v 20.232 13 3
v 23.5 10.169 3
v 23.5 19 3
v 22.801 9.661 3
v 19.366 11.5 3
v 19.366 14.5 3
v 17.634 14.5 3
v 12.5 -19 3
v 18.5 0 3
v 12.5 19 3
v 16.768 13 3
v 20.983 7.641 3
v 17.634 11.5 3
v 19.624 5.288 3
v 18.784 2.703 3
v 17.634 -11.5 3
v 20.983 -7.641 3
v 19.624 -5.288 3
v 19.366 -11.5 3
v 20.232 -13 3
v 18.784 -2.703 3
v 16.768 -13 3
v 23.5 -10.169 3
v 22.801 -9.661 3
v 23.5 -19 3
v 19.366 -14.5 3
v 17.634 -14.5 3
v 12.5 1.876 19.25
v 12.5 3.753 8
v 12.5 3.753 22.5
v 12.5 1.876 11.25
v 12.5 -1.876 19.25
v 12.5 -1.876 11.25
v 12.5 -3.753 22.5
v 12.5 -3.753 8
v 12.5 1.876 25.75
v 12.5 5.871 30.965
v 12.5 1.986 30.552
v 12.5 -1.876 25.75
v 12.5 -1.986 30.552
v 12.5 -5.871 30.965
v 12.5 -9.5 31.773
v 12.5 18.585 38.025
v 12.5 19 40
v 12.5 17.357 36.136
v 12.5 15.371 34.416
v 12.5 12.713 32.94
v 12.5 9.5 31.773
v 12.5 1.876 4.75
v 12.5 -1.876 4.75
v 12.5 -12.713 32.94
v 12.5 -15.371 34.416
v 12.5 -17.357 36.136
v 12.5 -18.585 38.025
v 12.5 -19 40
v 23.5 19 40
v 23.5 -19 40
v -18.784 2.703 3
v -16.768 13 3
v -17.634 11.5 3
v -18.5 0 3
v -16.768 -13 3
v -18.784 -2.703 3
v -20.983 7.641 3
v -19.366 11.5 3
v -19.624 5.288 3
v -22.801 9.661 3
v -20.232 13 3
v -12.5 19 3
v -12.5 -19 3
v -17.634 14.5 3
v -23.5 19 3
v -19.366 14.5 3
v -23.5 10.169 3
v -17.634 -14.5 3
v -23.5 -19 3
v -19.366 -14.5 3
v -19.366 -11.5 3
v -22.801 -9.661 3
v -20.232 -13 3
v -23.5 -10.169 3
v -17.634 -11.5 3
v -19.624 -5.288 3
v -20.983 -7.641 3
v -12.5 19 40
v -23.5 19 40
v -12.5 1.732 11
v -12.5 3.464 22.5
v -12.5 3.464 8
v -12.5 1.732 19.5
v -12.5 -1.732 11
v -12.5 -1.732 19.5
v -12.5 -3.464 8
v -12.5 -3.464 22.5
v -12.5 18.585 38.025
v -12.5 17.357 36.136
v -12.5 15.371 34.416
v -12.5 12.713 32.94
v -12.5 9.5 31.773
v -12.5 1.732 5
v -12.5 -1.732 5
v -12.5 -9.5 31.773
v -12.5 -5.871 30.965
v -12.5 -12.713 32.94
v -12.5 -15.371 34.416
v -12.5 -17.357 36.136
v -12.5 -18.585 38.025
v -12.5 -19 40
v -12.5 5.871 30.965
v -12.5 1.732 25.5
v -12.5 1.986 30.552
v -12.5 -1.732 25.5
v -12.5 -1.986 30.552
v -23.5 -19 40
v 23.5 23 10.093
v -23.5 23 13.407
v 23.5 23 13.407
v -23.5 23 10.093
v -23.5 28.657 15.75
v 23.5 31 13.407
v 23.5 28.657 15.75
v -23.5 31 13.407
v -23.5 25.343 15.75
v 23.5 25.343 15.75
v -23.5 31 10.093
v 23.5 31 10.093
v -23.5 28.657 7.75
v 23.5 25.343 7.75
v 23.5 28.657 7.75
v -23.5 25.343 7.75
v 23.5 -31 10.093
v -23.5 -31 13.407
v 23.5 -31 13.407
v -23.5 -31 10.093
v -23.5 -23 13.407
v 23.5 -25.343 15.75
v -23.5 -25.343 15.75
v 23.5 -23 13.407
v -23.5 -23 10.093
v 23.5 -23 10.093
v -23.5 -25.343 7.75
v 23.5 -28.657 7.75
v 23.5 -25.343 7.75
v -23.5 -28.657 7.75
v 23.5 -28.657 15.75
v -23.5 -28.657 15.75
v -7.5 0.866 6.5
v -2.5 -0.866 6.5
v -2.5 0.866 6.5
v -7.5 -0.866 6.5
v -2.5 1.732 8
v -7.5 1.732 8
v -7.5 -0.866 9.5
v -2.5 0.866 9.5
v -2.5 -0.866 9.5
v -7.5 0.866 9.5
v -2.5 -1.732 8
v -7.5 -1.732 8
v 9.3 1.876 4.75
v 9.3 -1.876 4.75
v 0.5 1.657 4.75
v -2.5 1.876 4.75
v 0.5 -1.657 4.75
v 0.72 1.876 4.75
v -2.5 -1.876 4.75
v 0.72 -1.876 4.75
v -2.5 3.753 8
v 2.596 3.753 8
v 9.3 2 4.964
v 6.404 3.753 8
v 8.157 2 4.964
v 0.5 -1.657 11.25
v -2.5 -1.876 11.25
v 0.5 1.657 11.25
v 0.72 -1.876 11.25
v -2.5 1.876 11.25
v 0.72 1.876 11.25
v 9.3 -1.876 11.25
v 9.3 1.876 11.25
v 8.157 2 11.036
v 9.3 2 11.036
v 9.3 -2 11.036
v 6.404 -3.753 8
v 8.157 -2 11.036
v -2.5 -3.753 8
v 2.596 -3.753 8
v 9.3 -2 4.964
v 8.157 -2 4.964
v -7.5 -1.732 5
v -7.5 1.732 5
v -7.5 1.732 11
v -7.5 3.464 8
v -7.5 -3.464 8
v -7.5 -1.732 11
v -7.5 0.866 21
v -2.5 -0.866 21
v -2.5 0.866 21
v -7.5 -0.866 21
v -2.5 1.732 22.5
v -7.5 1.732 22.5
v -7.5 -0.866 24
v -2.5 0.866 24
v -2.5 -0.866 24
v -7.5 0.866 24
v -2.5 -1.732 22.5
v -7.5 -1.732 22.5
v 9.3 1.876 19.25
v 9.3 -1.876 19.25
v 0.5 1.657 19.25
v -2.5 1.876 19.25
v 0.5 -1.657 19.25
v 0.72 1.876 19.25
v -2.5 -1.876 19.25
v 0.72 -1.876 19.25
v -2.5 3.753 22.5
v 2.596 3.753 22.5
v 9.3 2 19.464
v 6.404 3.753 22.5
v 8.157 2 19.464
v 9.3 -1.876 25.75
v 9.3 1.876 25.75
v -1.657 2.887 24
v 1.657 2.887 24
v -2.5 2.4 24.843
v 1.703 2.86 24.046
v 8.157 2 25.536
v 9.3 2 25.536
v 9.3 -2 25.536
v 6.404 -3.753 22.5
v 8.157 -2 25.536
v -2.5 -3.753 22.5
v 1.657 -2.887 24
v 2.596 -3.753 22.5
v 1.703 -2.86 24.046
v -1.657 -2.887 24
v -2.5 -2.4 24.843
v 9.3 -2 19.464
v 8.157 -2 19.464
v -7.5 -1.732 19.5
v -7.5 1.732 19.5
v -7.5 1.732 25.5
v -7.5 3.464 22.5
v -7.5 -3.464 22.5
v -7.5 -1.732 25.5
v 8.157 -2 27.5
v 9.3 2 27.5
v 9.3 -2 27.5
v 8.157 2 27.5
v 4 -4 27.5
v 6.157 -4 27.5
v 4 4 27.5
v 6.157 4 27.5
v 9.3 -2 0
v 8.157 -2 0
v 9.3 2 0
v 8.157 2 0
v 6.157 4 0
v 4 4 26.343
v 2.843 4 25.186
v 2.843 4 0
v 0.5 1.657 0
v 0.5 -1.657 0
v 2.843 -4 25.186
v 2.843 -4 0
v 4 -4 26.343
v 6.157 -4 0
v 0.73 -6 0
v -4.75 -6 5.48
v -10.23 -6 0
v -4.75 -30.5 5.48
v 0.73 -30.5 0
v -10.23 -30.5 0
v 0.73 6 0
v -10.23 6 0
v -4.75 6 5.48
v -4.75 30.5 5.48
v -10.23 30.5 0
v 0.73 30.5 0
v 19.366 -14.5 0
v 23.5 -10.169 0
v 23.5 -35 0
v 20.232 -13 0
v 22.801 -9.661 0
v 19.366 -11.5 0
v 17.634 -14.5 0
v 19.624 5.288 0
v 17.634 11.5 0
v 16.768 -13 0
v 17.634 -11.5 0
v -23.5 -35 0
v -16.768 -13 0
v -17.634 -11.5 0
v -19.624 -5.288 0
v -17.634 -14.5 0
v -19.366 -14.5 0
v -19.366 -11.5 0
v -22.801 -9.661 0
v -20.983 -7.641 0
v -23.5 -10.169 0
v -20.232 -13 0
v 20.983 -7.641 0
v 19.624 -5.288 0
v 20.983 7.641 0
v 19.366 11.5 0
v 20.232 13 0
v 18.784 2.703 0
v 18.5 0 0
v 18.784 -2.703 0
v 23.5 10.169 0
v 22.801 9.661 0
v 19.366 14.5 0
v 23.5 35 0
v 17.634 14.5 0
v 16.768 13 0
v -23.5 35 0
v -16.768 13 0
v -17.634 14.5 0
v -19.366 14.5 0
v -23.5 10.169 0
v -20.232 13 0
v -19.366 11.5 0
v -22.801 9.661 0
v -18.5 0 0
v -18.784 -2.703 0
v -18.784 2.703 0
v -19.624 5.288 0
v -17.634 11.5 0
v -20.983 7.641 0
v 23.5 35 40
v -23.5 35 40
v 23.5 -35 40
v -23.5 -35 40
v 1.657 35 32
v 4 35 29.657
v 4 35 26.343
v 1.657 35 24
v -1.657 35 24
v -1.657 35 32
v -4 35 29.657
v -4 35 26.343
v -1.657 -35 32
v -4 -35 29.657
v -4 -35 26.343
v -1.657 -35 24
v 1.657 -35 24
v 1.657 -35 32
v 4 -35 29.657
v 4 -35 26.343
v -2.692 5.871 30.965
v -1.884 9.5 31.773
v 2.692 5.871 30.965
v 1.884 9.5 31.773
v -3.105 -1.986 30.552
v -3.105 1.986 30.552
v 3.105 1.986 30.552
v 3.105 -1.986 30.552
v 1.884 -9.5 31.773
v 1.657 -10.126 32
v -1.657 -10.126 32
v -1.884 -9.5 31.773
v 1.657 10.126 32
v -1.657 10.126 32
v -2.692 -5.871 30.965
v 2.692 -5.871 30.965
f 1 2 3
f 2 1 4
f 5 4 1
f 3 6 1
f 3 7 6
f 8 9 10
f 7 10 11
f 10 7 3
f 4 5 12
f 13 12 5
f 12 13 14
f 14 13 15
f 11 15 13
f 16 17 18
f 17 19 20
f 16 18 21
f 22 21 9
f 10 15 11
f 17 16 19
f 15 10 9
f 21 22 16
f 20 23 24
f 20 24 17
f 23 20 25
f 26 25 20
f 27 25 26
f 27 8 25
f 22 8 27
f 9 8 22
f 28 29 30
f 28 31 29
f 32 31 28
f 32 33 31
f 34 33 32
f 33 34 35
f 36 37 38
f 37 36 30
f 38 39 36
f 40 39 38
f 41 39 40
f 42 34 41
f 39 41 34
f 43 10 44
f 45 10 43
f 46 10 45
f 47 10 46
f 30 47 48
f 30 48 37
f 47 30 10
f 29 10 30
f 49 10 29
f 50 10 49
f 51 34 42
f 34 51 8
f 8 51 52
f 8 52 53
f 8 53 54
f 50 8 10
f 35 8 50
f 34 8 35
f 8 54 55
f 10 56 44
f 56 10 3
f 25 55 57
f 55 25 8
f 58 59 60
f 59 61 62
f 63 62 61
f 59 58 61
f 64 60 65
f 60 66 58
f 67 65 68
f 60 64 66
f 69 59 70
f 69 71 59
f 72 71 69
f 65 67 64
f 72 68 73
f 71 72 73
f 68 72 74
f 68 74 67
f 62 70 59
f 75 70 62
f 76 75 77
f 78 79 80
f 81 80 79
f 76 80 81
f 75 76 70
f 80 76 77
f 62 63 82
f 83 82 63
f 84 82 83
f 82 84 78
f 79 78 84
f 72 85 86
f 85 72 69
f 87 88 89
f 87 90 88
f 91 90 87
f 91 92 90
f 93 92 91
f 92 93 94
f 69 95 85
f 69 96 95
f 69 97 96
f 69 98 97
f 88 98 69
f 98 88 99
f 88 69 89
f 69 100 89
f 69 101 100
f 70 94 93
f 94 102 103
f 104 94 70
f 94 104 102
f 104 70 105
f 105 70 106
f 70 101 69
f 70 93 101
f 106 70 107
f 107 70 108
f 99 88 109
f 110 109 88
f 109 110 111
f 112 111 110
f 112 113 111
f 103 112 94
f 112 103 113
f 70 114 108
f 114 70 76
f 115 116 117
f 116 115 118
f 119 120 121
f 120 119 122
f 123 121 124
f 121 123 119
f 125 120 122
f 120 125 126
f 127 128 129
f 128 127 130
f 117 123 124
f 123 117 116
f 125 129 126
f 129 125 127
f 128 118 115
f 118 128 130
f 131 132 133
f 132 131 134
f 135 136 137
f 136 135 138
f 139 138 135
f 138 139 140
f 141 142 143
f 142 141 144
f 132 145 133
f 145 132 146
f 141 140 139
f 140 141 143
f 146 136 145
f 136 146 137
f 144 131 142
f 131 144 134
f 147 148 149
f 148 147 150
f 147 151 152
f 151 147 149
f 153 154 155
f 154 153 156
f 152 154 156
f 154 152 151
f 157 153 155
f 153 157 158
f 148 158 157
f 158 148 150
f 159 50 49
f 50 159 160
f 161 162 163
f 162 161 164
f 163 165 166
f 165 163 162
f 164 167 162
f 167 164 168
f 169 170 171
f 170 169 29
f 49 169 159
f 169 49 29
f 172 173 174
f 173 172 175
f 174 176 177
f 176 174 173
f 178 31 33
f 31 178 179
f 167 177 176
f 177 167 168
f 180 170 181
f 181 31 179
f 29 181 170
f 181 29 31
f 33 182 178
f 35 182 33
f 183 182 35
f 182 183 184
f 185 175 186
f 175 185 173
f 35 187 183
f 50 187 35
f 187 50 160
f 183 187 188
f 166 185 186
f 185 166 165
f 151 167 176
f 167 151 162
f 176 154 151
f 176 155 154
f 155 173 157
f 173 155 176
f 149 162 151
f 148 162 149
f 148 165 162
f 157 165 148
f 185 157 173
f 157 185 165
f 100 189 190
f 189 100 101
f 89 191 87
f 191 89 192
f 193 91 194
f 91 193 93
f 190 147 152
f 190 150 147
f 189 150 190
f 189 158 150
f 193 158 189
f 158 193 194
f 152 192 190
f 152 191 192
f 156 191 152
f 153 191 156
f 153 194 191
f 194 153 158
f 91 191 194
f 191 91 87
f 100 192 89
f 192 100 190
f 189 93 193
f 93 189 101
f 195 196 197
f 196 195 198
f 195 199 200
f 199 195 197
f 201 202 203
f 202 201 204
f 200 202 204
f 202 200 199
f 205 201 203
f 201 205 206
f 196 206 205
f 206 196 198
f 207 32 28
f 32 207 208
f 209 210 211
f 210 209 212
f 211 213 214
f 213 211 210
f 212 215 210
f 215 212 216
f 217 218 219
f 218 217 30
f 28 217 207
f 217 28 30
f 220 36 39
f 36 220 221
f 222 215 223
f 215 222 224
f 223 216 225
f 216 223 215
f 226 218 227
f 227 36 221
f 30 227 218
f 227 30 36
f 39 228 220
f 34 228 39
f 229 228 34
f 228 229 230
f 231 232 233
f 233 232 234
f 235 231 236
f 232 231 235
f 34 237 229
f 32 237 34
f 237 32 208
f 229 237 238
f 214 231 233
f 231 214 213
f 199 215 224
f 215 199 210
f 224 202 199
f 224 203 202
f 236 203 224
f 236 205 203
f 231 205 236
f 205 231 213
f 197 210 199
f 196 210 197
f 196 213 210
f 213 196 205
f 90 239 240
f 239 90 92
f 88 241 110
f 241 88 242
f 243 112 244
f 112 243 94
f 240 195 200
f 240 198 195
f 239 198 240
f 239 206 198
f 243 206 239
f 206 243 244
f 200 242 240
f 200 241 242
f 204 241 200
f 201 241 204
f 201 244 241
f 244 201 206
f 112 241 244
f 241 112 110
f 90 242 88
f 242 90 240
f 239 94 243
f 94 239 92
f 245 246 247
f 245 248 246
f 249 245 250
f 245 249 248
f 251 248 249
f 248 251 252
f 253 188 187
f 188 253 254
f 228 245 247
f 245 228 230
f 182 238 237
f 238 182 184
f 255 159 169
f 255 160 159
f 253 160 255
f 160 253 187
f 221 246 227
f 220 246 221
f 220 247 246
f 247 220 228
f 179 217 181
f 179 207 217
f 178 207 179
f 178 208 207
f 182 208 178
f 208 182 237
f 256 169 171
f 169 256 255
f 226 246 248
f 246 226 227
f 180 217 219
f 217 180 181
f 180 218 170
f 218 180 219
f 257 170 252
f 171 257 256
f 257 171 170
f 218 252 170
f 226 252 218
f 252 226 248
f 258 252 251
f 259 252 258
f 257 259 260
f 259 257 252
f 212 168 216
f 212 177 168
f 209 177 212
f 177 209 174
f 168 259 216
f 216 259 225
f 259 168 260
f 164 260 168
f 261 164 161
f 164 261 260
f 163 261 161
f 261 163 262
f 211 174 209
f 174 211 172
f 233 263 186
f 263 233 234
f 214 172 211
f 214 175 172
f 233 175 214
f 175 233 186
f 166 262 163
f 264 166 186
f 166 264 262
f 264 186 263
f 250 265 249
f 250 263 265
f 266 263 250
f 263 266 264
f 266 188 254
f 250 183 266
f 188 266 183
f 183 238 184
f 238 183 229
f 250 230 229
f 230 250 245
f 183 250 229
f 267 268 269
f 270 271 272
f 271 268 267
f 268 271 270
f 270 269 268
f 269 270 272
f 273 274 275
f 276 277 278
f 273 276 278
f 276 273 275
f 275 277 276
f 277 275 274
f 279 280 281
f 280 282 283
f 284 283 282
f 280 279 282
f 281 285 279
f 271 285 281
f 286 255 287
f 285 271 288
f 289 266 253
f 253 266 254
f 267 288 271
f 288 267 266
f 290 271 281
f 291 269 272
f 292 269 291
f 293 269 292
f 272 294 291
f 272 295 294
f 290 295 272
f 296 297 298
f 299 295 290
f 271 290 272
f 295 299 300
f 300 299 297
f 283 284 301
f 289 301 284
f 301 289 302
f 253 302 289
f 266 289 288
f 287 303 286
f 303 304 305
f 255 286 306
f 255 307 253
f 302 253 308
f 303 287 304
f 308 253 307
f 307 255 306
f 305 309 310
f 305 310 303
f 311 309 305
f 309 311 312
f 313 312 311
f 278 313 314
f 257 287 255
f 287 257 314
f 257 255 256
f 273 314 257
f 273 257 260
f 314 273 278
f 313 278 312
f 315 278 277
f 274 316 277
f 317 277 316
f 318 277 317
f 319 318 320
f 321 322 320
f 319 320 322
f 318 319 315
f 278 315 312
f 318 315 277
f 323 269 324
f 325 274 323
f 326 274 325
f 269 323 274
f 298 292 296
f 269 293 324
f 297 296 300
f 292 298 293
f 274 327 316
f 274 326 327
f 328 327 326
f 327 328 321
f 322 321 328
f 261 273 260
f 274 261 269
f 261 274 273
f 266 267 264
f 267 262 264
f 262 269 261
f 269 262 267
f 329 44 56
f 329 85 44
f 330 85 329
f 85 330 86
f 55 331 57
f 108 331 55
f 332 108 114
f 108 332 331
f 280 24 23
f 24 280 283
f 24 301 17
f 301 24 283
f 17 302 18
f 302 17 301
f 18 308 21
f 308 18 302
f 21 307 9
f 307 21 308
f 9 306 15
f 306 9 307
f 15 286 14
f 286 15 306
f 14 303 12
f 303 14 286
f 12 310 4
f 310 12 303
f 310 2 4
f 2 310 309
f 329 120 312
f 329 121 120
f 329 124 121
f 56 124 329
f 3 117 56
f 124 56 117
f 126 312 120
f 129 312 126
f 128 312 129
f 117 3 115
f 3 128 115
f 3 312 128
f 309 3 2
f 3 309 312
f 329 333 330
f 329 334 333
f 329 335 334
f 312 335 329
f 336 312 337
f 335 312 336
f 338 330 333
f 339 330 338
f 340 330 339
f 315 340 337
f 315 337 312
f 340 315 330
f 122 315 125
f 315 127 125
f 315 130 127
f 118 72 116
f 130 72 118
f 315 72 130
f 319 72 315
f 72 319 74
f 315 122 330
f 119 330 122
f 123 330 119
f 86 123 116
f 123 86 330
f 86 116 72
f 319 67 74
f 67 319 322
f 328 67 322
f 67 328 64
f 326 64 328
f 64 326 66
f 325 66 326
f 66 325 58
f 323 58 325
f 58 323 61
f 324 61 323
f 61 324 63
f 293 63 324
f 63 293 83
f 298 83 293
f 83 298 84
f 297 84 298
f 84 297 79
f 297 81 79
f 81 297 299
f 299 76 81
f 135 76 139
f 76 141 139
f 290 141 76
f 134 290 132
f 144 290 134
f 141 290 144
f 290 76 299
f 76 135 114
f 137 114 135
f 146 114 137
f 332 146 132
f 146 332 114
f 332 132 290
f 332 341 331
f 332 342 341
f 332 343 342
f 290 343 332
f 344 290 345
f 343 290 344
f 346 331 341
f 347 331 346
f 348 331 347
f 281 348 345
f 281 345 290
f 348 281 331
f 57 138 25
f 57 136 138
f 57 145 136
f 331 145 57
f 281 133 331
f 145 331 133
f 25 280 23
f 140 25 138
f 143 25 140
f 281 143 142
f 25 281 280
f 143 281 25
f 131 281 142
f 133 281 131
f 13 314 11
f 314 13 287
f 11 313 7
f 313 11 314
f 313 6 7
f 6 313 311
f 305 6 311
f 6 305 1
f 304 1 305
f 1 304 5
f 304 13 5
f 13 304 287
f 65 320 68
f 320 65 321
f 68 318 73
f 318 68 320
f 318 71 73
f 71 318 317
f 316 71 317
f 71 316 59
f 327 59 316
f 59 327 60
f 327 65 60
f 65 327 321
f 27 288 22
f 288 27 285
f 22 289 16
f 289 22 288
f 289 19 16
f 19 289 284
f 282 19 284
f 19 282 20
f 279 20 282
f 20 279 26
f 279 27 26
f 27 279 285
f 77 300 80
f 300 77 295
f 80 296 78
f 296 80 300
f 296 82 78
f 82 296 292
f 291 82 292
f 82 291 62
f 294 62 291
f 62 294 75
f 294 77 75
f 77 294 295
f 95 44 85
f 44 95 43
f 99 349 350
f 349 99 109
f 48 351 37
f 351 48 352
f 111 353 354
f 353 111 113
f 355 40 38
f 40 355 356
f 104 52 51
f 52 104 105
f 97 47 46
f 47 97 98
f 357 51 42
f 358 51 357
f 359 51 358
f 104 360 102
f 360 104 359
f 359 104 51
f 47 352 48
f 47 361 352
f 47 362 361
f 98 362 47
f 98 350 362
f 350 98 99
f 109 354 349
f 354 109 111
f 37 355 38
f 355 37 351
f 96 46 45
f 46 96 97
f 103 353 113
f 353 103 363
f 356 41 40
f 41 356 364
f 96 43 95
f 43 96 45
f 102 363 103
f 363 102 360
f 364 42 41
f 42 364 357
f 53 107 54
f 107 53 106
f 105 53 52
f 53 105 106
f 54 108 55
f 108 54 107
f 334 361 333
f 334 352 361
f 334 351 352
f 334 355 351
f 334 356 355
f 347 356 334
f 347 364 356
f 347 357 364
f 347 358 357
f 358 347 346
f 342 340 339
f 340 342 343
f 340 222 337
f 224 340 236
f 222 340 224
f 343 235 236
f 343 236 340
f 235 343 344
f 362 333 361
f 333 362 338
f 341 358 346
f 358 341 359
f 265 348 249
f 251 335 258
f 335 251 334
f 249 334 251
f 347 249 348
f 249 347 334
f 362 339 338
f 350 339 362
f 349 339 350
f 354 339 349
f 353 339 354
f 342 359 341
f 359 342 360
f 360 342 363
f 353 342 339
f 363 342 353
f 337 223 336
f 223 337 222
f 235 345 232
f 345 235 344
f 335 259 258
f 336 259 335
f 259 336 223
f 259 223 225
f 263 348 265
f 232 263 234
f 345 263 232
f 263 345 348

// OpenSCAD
// file: base_end_2off_left.scad
include <settings.scad>;

!base_end();

module base_end(left = true) difference() {
    union() {
        linear_extrude(height = end_height, convexity = 5) difference() {
            square([yz_motor_distance + motor_casing - motor_screw_spacing + 10, motor_casing + rod_size * 4], center = true);
            for(end = [1, -1]) {
                for(side = [1, -1]) translate([end * (yz_motor_distance + motor_casing - motor_screw_spacing) / 2, side * motor_screw_spacing / 2, 0]) circle(m3_size * da6, $fn = 6);
                translate([end * (yz_motor_distance + motor_casing) / 2, 0, 0]) circle(motor_screw_spacing / 2);
            }
        }
        // z stop sensor attachment
        if (left) {
            // z stop mount support structure
            difference() {
                linear_extrude(height = end_height, convexity = 5) difference() {
                    translate ([(yz_motor_distance+motor_casing - motor_screw_spacing + 10)/2, -motor_casing/2 - rod_size * 2, 0]) {
                        square([z_mount_width - ((yz_motor_distance + motor_casing - motor_screw_spacing + 10)/2 - z_stop_x_offset), rod_size * 2]);
                    }
                    translate([(yz_motor_distance+motor_casing - motor_screw_spacing + 10)/2 + z_mount_width - ((yz_motor_distance + motor_casing - motor_screw_spacing + 10)/2 - z_stop_x_offset),-motor_casing/2,0]) resize([(z_mount_width - ((yz_motor_distance + motor_casing - motor_screw_spacing + 10)/2 - z_stop_x_offset))*2,rod_size * 4]) circle (1,$fn = 32);
                }
                translate([z_stop_x_offset + z_mount_width, -motor_casing/2 - rod_size * 2,m3_nut_size+z_stop_mount_z_buffer])
                    rotate([0,-atan2(z_mount_width - ((yz_motor_distance + motor_casing - motor_screw_spacing + 10)/2 - z_stop_x_offset), end_height-m3_nut_size-z_stop_mount_z_buffer),0])
                        cube([(z_mount_width - ((yz_motor_distance + motor_casing - motor_screw_spacing + 10)/2 - z_stop_x_offset)), rod_size * 2, sqrt(pow((z_mount_width - ((yz_motor_distance + motor_casing - motor_screw_spacing + 10)/2 - z_stop_x_offset)),2)+pow(end_height-m3_nut_size-z_stop_mount_z_buffer,2))]);
            }
            // z stop mount
            translate([z_stop_x_offset, -m3_nut_height-(z_stop_mount_y_buffer*2)-(motor_casing + (rod_size*4))/2, 0]){
                difference () {
                    cube([z_mount_width, m3_nut_height+(z_stop_mount_y_buffer*2), m3_nut_size+z_stop_mount_z_buffer]);
                    // holes for bolting
                    for(side = [0,1]) {
                        translate([(m3_nut_size+(z_stop_mount_x_buffer*2))/2+side*z_stop_screw_spacing,
                                   m3_nut_height/2+z_stop_mount_y_buffer,
                                   m3_nut_size/2]){
                            cube([m3_nut_size,m3_nut_height,m3_nut_size],center=true);
                            if (z_stop_side_holes)
                             rotate([0,90,0])
                              translate([0,0,(side-.5)*(z_stop_mount_x_buffer+m3_nut_size)])
                               cylinder(h=z_stop_mount_x_buffer,r=m3_size * da6, $fn = 6, center=true);
                            if (z_stop_bottom_holes)
                              translate([0,0,(z_stop_mount_z_buffer+m3_nut_size)/2])
                               cylinder(h=z_stop_mount_z_buffer,r=m3_size * da6, $fn = 6, center=true);
 
                            rotate([90,0,0])
                             translate([0,0,(z_stop_mount_y_buffer+m3_nut_height)/2])
                              cylinder(h=z_stop_mount_y_buffer,r=m3_size * da6, $fn = 6, center=true);
                        }
                    }
                }
            }
        }
    }
    // motor cutouts
	for(end = [1, -1]) translate([end * (yz_motor_distance + motor_casing) / 2, 0, 3]) linear_extrude(height = end_height, convexity = 5) square(motor_casing, center = true);
    // holes for x axis threaded rod for connecting to other base.
	for(side = [1, -1]) translate([0, side * (motor_casing / 2 + rod_size), rod_size / 2 + bearing_size / 2]) rotate([90, 180 / 8, 90]) {
		cylinder(r = rod_size * da8, h = yz_motor_distance + motor_casing + 20, center = true, $fn = 8);
		%translate([0, 0, -70]) cylinder(r = rod_size * da8, h = 200, center = true, $fn = 8);
	}
    
	if (left) for(side = [1, -1]) translate([0, side * (motor_casing / 2 + rod_size), rod_size / 2 + bearing_size / 2]) rotate([90, 180 / 6, 90])
		translate([0,0,(yz_motor_distance + motor_casing - motor_screw_spacing + 10)/2 - 5])
            cylinder(r = rod_nut_size / 2, h = z_mount_width+z_stop_x_offset, center = false, $fn = 6);

    // bottom arch. Mostly cosmetic.
	translate([0, 0, end_height]) scale([1, 1, .5]) rotate([90, 0, 90]) cylinder(r = motor_casing / 2, h = yz_motor_distance + 20, center = true);
    // z smooth rod hole and holes for securing z rod.
	translate([yz_motor_distance / 2 - rod_size, 0, 0]) {
		translate([0, 0, -3]) linear_extrude(height = end_height - motor_casing / 4, convexity = 5) {
			rotate(180 / 8) circle(rod_size * da8, $fn = 8);
			translate([0, -rod_size / 4, 0]) square([rod_size * .6, rod_size / 2]);
		}
		// z axis clamping
		for(h = [8, end_height - motor_casing / 4 - 8]) translate([0, 0, h]) rotate([90, 0, 90]) {
			cylinder(r = m3_size * da6, h = yz_motor_distance + motor_casing, center = true, $fn = 6);
			translate([0, 0, -rod_size / 2 - 3]) cylinder(r = m3_nut_size* da6, h = yz_motor_distance + motor_casing, $fn = 6);
			translate([0, 0, 0]) cylinder(r = m3_nut_size / 2 + 0.5, h = yz_motor_distance + motor_casing, $fn = 6);
			translate([0, 0, -rod_size / 2 - 8]) rotate([0, 180, 0]) cylinder(r = m3_size * da6 * 2, h = yz_motor_distance + motor_casing, $fn = 6);
		}
	}
    // y bearing holes
	translate([-yz_motor_distance / 2 + bearing_size / 2, 0, -bearing_size * sqrt(2) / 4]) rotate([90, -45, 0]) {
		%cylinder(r = rod_size * da8, h = 100, center = true, $fn = 8);
		for(side = [0, 1]) mirror([0, 0, side]) translate([0, 0, rod_size / 2 + 2]) {
			cylinder(r = bearing_size / 2, h = bearing_length, center = false, $fn = 80);
			cube([bearing_size / 2, bearing_size / 2, bearing_length]);
		}
	}
    // y support rod hole
	translate([0, 0, end_height - rod_size * 1.5]) rotate([90, 180 / 8, 0]) cylinder(r = rod_size * da8, h = motor_casing + rod_size * 5, $fn = 8, center = true);
	%translate([0, 0, end_height - rod_size * 1.5]) rotate([90, 180 / 8, 0]) cylinder(r = rod_size * da8, h = 100, $fn = 8, center = true);
}
// file: settings.scad
rod_size = 8;
rod_nut_size = 15; //12 for M6, 15 for M8
bearing_size = 15.5; //12.5 for LM6UU, 15.5 for LM8UU,LM8SUU
bearing_length = 24.5; //19.5 for LM6UU, 17.5 for LM8SUU, 24.5 for LM8UU
yz_motor_distance = 25;
motor_screw_spacing = 26; //26 for NEMA14, 31 for NEMA17
motor_casing = 38; //38 for NEMA14, 45 for NEMA17
end_height = 40; //measure the height of your motor casing and add 4mm. Suggestion: 40 for NEMA14, 55 for NEMA17
bed_mount_height = 16;
//x_rod_spacing = motor_screw_spacing + 3 + rod_size;
x_rod_spacing = 30;
x_carriage_width = 70;
carriage_extruder_offset = 5;
pulley_size = 20;
idler_pulley_width = 10;
gusset_size = 15;
m3_size = 3;
m3_nut_size = 6.5;
// m3 nut height is because tristan doesn't know the height of an m3 nut, it is not implemented everywhere, just on the z stop in base_end_2off.scad
m3_nut_height = 3;
m4_size = 4;
motor_shaft_size = 5;

z_stop_screw_spacing = 20;
// these may be super unneeded, in which case we can easily do a search and replace. But they may be really useful for prototyping/whatever.
z_stop_mount_x_buffer = 2;
z_stop_mount_y_buffer = 2;
z_stop_mount_z_buffer = 2;
z_stop_side_holes = true;
z_stop_bottom_holes = false;

z_stop_arm_actuator_width = 2;
z_stop_arm_actuator_depth = 8;
z_stop_arm_actuator_height = 60;
z_stop_depth = 5;//this is for the optical endstop, this is the width from where it is mounted to where it is clear for the arm to go through.
z_stop_x_adjust=0;

// meta vars, these are set by other vars for ease of reference.
z_mount_width = m3_nut_size+z_stop_screw_spacing+(z_stop_mount_x_buffer*2);
base_z_rod_x_offset = yz_motor_distance / 2 - rod_size;
distance_between_x_end_cylinders = motor_casing / 2 + rod_size;
z_stop_x_offset = base_z_rod_x_offset + distance_between_x_end_cylinders - (z_mount_width/2) + z_stop_x_adjust;
x_end_cylinder_radius = bearing_size / 2 + 3;
x_end_front_face_y_offset = (bearing_size / 2 + 3)/2;//In case it's non obvious, this is for getting the amount the x end cylinders extend past the front face.
x_end_cylinder_protrution_depth = x_end_cylinder_radius - x_end_front_face_y_offset;
z_stop_arm_depth = z_stop_arm_actuator_depth + z_stop_depth + m3_nut_height+(z_stop_mount_y_buffer*2)+(motor_casing + (rod_size*4))/2 - x_end_front_face_y_offset;
z_stop_arm_height = z_stop_arm_actuator_height + x_rod_spacing + 8 + rod_size;
z_stop_arm_x_support_depth = (z_stop_arm_depth - x_end_cylinder_protrution_depth) / 3;

// ratio for converting diameter to apothem
da6 = 1 / cos(180 / 6) / 2;
da8 = 1 / cos(180 / 8) / 2;
// main file
include <settings.scad>;
use <base_end_2off_left.scad>;

!base_end(left=false);
